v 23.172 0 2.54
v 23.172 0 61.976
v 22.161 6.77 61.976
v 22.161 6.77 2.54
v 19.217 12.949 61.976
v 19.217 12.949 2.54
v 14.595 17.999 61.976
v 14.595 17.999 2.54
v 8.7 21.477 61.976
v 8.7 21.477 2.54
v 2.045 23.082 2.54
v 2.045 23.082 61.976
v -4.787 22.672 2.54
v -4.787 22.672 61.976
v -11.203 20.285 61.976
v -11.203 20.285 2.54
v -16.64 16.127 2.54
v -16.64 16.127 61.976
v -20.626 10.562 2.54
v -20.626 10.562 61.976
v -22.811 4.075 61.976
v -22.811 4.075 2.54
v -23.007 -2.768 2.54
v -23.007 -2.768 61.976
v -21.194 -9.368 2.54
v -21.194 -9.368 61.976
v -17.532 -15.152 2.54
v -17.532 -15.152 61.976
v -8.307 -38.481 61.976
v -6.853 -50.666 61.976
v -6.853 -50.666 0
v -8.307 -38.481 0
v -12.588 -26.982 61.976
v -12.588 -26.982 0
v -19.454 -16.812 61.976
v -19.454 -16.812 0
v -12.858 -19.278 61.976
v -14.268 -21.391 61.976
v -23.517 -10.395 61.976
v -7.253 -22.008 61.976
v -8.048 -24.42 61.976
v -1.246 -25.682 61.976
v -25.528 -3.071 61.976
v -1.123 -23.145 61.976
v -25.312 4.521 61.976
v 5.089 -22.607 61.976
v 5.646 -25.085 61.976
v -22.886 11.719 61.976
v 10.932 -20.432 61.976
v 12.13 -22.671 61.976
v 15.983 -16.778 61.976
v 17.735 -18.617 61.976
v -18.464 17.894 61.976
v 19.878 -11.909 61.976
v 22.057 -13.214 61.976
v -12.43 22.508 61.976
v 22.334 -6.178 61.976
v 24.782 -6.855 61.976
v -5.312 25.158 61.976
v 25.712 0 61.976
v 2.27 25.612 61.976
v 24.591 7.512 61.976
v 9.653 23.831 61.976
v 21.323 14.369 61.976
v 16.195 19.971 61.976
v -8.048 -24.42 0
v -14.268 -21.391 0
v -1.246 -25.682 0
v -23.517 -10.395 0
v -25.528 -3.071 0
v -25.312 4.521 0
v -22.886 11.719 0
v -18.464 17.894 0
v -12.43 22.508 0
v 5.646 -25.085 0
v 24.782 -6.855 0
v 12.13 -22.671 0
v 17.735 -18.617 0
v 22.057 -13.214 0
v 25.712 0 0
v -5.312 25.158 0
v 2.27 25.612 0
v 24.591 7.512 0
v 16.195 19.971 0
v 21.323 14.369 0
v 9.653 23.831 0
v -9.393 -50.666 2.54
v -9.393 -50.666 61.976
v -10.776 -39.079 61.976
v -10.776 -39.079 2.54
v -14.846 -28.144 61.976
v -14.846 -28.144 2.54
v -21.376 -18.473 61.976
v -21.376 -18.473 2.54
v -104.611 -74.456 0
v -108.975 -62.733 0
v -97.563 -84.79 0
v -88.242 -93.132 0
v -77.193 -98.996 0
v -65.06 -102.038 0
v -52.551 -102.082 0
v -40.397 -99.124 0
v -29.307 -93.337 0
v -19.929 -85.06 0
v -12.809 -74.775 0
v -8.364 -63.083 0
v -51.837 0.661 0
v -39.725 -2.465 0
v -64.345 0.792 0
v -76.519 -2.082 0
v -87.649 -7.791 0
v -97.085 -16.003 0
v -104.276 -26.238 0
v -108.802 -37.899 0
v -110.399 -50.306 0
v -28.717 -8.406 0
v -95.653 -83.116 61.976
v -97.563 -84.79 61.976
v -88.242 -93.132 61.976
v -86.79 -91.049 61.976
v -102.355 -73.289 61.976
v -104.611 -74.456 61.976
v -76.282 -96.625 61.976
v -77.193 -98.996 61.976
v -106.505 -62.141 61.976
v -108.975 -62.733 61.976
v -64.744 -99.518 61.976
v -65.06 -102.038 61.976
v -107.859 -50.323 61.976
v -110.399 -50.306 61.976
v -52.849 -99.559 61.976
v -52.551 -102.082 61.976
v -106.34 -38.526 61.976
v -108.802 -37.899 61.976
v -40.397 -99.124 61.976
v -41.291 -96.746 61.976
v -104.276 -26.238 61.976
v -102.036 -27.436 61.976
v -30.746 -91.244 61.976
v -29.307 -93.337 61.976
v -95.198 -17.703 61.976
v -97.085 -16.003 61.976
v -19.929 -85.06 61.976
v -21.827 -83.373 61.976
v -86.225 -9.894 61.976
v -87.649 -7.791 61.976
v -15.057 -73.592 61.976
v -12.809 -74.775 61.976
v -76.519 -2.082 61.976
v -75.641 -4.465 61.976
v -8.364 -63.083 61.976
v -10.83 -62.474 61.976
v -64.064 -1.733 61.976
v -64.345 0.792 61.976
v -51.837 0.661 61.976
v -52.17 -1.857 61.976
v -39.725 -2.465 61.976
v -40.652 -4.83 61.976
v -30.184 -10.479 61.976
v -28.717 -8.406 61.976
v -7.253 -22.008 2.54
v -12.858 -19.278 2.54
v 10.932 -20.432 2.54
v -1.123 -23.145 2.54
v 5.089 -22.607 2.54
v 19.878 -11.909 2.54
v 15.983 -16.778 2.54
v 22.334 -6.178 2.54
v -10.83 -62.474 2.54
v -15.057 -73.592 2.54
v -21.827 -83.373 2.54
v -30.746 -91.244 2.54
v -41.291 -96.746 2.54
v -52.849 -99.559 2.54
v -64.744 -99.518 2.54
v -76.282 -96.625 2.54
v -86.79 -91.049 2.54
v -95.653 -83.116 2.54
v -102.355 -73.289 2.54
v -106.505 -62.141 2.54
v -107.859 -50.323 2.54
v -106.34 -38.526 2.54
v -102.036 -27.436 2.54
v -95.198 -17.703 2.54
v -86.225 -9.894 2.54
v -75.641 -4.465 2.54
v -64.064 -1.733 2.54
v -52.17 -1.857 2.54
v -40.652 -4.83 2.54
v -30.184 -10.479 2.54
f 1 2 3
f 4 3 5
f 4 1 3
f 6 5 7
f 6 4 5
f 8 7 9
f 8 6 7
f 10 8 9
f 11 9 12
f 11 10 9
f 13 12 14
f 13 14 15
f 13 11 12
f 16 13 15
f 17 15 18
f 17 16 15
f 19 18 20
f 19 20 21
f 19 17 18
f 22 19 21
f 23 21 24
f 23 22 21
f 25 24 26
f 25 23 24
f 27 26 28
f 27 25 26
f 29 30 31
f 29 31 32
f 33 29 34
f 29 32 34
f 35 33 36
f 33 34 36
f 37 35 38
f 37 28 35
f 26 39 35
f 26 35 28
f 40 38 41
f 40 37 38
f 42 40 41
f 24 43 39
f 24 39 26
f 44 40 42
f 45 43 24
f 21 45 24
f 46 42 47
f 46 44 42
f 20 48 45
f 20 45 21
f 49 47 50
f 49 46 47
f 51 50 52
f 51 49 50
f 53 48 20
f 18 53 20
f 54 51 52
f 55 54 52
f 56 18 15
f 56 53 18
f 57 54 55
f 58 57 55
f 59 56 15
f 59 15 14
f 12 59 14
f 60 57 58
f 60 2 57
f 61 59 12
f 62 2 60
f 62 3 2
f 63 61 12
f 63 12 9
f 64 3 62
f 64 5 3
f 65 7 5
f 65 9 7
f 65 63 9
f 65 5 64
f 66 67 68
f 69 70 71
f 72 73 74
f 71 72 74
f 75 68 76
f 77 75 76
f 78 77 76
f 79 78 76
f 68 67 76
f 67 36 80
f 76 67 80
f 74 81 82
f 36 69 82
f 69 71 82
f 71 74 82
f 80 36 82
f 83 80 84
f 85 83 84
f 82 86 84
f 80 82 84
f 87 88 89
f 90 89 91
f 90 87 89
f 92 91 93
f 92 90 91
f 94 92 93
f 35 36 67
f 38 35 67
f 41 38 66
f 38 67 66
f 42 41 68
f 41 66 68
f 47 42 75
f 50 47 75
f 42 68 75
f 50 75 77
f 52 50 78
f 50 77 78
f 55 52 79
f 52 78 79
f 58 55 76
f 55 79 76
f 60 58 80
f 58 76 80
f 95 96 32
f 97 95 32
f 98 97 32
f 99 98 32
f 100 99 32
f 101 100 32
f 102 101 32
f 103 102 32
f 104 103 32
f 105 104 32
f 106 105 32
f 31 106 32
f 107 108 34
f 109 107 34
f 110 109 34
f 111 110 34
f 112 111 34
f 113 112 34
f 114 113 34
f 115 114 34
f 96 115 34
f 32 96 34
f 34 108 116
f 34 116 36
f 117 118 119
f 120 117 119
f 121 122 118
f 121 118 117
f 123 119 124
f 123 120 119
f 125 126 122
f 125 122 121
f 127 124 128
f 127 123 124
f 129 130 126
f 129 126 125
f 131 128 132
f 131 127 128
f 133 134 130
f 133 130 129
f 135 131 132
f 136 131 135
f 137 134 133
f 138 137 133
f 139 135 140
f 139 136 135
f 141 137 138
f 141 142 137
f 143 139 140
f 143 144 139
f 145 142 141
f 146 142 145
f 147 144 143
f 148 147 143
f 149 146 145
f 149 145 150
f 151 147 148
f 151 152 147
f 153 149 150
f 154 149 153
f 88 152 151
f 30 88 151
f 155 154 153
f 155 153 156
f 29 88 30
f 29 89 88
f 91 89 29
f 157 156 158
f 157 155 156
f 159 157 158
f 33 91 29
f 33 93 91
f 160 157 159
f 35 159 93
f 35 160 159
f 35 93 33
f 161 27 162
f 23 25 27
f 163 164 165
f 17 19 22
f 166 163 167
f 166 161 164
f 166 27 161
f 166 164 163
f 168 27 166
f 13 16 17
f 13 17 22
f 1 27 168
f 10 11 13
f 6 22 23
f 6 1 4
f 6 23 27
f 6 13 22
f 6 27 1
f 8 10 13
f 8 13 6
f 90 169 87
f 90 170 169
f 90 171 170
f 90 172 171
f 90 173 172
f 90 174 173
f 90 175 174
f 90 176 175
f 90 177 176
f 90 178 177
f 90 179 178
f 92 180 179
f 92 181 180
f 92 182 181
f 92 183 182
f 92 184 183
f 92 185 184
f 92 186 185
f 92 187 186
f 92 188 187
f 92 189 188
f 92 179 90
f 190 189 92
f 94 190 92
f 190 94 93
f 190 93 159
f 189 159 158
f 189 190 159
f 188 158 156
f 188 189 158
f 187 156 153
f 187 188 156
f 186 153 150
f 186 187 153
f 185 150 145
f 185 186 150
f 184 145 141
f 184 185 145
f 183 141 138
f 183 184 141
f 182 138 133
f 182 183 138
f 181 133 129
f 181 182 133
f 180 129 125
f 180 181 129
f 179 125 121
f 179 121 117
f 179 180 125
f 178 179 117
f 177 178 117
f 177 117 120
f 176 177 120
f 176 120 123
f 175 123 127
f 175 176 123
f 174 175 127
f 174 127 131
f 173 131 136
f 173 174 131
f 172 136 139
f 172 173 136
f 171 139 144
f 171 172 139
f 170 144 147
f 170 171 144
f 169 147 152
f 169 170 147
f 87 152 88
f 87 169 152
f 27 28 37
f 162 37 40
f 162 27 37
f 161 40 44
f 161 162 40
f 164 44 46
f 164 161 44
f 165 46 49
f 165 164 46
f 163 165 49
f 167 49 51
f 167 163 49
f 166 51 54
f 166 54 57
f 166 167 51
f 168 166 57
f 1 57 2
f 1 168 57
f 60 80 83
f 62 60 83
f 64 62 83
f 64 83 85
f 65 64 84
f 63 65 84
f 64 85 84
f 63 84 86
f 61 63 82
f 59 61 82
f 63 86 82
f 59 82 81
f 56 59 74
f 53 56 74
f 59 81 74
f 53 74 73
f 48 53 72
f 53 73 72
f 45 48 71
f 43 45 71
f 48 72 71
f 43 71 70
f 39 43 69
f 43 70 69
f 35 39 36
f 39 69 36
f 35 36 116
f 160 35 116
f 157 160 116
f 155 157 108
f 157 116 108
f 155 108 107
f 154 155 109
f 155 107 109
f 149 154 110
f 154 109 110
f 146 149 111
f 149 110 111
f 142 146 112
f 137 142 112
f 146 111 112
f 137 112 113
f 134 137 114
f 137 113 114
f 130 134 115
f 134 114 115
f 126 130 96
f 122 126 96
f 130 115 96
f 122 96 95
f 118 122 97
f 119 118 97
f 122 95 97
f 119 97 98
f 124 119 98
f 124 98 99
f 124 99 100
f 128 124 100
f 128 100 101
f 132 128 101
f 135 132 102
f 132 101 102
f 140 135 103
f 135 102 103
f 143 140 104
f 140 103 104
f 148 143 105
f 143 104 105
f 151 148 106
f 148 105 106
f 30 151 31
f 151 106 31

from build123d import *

# Parameters (mm, degrees)
F1_DEPTH = 61.976
F2_T     = -2.54
F2_2_T   = -2.54


with BuildPart() as f1:
    # F0 (on Top) → F1 (new body)
    with BuildSketch(Plane.XY):
        with BuildLine():
            ThreePointArc((-19.4542617316, -16.8124381999), (-107.1481920765, -68.7266891224), (-6.8530802985, -50.6655313075))
            ThreePointArc((-6.8530802985, -50.6655313075), (-10.1055361344, -32.6043734926), (-19.4542617316, -16.8124381999))
        make_face()
    extrude(amount=F1_DEPTH)

    # F2
    f2_openings = [f1.faces().sort_by_distance(p)[0] for p in [
        (-58.626864, -50.665531, 61.976),
    ]]
    offset(amount=F2_T, openings=f2_openings)


with BuildPart() as f1b:
    # F0 (on Top) → F1, piece 2 (new body)
    with BuildSketch(Plane.XY):
        with BuildLine():
            ThreePointArc((25.7123779092, 0), (-8.9697003339, 24.0971129737), (-19.4542617316, -16.8124381999))
            ThreePointArc((-19.4542617316, -16.8124381999), (8.9697003339, -24.0971129737), (25.7123779092, 0))
        make_face()
    extrude(amount=F1_DEPTH)

    # F2#2
    f2_2_openings = [f1b.faces().sort_by_distance(p)[0] for p in [
        (0, 0, 61.976),
    ]]
    offset(amount=F2_2_T, openings=f2_2_openings)


solid = Compound([f1.part, f1b.part])
